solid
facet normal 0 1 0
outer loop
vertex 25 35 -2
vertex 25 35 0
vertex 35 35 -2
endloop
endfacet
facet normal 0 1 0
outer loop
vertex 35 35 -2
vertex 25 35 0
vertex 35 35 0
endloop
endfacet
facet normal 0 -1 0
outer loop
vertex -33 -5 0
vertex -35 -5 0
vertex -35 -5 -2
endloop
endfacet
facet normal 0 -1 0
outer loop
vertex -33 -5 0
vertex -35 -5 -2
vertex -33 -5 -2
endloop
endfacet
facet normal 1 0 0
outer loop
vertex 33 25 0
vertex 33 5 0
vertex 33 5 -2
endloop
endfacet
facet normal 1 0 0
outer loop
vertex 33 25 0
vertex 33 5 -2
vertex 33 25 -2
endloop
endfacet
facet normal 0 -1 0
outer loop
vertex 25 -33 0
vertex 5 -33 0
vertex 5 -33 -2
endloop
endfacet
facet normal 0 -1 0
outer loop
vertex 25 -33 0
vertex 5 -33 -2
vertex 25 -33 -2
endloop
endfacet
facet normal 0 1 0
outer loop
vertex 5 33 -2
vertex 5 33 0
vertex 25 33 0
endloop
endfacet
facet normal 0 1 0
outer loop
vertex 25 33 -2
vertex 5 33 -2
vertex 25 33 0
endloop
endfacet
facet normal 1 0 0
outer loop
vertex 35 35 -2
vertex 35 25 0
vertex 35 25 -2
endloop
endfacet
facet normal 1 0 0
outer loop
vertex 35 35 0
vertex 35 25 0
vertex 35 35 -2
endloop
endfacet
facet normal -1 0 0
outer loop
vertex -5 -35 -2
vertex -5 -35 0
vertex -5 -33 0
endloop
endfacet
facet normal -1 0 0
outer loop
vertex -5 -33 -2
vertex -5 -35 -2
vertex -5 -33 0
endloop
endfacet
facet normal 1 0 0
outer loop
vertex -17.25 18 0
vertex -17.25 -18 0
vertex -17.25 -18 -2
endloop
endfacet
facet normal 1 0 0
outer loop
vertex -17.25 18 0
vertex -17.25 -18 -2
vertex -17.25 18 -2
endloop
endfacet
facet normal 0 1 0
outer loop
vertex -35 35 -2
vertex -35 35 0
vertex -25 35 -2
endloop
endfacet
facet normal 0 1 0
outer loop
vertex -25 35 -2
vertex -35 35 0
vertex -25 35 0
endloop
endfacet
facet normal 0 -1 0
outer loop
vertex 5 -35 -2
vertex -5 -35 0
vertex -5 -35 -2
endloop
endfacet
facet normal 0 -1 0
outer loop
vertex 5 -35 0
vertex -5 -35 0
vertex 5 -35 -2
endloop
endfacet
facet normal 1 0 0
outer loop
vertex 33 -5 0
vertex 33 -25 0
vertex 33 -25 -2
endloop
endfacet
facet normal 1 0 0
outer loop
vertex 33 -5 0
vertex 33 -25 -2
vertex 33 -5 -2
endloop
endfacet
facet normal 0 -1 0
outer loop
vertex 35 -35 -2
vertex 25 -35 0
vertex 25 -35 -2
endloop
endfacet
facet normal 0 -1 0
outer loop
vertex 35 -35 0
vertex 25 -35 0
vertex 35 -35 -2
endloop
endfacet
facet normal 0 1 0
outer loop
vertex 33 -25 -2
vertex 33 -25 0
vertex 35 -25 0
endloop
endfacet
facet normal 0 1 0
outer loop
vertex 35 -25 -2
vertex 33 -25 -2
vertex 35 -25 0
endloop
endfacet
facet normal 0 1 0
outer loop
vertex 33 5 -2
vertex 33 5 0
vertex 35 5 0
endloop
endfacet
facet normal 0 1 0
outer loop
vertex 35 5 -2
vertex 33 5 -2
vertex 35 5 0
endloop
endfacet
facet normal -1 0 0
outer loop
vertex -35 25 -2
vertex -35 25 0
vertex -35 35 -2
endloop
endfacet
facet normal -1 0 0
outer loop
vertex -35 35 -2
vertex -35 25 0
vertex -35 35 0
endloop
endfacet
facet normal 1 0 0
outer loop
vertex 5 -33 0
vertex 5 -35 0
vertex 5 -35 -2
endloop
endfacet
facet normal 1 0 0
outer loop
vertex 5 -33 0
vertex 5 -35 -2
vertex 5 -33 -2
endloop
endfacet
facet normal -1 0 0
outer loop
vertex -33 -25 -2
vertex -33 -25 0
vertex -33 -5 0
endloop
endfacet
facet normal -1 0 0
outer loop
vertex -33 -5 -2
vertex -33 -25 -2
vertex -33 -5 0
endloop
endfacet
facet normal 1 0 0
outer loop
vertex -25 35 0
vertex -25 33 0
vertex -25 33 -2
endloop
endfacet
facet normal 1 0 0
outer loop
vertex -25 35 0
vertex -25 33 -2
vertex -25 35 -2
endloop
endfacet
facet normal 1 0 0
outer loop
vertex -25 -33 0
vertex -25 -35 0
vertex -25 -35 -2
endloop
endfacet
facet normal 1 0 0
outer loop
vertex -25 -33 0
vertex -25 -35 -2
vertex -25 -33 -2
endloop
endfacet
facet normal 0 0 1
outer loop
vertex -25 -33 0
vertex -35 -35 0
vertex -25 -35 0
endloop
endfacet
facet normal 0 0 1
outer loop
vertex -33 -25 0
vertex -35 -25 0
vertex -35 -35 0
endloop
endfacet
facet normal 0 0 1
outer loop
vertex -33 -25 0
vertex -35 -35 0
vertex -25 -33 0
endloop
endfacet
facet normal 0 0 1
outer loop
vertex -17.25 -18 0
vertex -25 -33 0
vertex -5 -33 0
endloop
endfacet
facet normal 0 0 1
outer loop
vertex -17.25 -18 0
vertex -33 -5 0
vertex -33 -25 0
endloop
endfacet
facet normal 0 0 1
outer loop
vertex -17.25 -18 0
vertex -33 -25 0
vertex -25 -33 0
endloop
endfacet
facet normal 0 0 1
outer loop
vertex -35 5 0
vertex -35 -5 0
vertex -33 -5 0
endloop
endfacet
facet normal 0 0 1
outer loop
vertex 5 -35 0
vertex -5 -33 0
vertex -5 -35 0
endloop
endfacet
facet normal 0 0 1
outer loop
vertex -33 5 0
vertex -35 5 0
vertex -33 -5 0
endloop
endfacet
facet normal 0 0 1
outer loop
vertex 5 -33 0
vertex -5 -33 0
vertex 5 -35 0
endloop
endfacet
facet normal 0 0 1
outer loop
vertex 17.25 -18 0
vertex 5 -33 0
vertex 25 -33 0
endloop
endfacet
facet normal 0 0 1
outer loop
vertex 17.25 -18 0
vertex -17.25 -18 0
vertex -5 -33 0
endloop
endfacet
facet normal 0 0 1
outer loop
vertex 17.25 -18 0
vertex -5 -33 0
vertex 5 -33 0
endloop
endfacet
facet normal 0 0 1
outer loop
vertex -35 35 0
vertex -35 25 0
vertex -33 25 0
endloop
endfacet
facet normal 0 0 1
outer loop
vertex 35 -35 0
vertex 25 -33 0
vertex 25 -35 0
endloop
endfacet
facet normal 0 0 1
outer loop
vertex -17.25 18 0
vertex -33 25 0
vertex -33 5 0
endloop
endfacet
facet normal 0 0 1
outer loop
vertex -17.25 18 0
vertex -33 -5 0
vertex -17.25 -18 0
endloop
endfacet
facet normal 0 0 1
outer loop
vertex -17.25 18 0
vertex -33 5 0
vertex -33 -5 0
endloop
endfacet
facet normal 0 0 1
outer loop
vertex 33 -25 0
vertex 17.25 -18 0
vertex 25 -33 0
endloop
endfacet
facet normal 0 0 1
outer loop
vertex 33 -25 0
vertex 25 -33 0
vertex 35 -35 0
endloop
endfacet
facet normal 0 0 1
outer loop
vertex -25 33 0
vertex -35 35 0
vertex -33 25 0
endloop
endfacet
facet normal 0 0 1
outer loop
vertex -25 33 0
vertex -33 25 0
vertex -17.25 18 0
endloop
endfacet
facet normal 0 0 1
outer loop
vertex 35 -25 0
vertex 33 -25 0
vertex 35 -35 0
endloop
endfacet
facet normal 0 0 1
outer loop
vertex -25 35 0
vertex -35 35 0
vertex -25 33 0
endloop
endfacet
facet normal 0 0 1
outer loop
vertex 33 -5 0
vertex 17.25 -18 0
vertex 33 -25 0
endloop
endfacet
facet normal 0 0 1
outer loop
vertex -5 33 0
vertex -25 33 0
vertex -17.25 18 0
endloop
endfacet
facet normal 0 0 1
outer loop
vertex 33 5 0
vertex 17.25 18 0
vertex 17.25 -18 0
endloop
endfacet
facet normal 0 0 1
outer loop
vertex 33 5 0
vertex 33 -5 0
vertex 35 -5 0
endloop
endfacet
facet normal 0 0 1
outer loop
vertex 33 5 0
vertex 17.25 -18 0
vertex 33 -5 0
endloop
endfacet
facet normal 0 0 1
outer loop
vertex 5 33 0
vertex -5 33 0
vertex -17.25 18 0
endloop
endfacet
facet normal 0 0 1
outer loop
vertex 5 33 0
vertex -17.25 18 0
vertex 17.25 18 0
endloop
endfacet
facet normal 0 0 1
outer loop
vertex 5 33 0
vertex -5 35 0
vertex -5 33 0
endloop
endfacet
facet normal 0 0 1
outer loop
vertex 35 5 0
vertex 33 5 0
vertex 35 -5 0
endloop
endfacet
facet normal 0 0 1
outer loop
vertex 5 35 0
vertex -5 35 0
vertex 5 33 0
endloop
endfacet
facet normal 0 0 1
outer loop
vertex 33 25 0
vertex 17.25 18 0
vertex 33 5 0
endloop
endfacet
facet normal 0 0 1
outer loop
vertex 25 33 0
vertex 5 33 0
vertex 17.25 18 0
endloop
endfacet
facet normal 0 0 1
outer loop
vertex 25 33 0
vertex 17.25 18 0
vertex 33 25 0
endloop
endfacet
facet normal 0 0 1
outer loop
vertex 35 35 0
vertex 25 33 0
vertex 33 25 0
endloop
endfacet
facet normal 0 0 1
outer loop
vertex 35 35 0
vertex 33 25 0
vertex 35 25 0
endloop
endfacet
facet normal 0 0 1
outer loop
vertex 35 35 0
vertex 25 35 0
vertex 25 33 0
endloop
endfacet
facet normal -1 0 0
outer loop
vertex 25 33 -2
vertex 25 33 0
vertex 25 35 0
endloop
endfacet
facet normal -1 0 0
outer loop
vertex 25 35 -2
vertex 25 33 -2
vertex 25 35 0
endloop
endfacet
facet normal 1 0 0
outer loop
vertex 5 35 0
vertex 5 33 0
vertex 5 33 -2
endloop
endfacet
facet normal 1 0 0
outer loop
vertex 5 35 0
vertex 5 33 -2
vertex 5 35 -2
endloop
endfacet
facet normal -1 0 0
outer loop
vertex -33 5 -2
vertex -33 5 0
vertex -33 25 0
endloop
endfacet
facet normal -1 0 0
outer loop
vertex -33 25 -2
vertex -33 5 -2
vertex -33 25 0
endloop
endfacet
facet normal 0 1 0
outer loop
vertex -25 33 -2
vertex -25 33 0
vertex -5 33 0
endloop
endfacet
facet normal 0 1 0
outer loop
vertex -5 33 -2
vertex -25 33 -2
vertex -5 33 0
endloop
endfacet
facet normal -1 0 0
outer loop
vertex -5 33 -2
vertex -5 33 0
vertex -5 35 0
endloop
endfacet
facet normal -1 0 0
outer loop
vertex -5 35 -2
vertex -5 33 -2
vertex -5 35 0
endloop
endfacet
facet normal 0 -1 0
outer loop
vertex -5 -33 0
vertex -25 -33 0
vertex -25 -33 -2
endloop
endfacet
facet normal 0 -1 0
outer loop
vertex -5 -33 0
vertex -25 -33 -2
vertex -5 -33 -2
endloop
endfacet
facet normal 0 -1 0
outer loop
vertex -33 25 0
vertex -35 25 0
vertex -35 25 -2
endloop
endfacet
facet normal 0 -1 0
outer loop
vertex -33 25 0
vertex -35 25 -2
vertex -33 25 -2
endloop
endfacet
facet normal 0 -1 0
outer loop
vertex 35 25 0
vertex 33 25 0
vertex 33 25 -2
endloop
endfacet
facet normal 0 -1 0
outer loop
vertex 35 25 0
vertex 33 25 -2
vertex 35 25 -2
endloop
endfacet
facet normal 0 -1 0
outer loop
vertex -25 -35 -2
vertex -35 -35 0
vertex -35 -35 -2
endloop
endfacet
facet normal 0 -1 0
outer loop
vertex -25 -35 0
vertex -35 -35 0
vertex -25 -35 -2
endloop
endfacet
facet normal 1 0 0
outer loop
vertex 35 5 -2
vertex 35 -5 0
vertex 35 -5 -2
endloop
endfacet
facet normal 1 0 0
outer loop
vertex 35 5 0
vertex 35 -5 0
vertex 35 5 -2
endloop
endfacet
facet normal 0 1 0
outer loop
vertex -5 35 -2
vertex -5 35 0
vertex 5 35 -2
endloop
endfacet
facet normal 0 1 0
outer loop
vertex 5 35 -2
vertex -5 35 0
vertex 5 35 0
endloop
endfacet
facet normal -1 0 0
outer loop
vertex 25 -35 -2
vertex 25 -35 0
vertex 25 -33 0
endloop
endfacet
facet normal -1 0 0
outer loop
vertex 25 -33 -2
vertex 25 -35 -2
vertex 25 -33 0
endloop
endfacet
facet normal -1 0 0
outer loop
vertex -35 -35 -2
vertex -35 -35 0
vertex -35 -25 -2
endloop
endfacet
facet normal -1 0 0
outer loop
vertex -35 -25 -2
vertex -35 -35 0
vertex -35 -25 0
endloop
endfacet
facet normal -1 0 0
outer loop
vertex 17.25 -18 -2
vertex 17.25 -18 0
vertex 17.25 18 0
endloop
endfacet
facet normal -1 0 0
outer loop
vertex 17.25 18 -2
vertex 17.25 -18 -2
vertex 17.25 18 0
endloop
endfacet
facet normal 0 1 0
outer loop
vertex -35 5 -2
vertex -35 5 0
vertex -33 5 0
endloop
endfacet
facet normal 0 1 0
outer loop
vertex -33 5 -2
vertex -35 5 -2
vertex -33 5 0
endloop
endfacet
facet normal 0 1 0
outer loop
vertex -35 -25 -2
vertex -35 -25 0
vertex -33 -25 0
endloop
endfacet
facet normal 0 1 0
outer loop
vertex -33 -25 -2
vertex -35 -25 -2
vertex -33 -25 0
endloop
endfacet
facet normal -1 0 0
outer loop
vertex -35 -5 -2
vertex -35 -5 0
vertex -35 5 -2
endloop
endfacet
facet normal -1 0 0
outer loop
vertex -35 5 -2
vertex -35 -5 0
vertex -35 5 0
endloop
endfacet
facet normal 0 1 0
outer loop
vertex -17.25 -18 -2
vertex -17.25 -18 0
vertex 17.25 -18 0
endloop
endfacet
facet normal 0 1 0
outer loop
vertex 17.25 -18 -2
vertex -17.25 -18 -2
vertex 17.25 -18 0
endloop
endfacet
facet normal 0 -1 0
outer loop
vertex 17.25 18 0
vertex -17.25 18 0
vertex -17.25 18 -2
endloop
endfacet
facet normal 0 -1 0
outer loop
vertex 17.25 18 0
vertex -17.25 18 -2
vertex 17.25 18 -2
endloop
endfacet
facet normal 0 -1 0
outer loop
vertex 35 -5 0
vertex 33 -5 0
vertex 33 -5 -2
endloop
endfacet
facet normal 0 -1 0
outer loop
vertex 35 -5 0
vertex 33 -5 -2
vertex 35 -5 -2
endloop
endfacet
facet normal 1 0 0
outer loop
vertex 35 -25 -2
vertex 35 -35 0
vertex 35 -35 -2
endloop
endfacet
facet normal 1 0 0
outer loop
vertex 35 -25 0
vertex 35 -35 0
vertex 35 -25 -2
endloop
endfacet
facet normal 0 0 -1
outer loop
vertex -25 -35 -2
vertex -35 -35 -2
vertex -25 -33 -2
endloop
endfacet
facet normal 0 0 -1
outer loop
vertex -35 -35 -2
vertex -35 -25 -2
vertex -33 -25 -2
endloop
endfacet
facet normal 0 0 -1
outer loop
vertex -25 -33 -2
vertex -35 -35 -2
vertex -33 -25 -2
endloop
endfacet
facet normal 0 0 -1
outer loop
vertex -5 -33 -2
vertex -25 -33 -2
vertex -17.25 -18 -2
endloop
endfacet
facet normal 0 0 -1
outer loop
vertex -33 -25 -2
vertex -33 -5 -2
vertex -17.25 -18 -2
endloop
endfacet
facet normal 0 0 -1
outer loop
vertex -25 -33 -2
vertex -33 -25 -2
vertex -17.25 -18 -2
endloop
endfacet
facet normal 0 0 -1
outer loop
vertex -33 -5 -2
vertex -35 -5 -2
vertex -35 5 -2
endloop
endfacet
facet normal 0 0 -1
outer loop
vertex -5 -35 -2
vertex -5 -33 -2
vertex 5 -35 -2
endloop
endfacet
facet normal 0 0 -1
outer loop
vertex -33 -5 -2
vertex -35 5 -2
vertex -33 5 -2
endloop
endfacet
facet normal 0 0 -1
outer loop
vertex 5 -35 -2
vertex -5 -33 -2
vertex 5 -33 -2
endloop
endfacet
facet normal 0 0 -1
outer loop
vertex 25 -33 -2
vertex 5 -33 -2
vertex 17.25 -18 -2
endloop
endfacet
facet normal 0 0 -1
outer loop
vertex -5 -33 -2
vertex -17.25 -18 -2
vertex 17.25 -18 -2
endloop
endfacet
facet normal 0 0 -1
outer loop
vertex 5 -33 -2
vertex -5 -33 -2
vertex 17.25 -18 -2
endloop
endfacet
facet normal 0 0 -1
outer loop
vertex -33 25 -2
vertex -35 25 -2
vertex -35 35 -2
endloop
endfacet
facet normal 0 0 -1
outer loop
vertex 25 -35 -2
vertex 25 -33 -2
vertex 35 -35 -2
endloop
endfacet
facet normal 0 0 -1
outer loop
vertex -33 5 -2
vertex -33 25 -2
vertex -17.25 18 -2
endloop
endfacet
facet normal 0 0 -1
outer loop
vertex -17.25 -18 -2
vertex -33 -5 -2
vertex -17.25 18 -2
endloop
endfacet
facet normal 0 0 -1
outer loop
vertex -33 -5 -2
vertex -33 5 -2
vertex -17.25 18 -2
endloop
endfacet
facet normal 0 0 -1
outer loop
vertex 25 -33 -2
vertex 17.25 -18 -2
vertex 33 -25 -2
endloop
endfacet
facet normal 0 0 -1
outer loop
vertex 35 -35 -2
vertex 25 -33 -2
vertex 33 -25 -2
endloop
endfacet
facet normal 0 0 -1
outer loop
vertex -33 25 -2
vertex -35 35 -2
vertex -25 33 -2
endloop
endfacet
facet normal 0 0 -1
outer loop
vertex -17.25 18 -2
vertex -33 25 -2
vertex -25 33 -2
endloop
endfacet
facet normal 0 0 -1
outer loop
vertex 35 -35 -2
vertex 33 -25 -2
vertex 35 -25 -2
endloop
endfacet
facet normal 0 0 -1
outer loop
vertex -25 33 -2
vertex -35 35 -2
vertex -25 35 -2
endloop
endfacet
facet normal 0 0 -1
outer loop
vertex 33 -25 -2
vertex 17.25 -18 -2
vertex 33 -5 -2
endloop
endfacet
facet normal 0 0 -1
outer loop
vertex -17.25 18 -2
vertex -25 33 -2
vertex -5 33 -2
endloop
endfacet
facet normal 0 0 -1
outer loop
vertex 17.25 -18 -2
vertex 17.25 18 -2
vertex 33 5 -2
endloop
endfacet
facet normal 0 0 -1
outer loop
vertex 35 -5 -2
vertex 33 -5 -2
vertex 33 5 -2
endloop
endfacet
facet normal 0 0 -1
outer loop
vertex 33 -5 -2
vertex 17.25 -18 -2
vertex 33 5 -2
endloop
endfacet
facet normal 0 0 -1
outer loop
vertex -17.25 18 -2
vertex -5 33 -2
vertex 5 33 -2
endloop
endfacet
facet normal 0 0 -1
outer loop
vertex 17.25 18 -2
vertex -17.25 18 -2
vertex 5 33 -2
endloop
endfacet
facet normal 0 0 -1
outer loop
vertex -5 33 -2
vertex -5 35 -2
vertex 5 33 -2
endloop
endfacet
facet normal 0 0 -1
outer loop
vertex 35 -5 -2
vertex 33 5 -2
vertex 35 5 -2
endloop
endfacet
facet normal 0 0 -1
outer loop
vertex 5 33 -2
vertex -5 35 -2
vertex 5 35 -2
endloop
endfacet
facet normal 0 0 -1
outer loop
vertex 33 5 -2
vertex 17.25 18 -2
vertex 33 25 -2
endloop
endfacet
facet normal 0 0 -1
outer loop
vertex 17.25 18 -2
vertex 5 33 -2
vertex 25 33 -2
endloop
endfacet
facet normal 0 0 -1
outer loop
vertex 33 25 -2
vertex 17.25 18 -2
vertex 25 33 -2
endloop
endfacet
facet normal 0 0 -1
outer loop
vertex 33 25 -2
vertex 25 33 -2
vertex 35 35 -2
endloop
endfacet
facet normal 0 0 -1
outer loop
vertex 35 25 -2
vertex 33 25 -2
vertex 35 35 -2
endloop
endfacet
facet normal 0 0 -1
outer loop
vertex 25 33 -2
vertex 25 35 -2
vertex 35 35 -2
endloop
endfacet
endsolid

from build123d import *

# Parameters (mm, degrees)
SKETCH1_W           = 70
SKETCH1_H           = 70
SKETCH1_W_2         = 34.5
SKETCH1_H_2         = 36
BOSS_EXTRUDE1_DEPTH = 2
SKETCH2_W           = 2
SKETCH2_H           = 20
SKETCH2_W_2         = 20
SKETCH2_H_2         = 2
CUT_EXTRUDE1_DEPTH  = 2


with BuildPart() as part:
    # Sketch1 → Boss-Extrude1 (new body)
    with BuildSketch(Plane.XY):
        Rectangle(SKETCH1_W, SKETCH1_H)
        Rectangle(SKETCH1_W_2, SKETCH1_H_2, mode=Mode.SUBTRACT)
    extrude(amount=-BOSS_EXTRUDE1_DEPTH)

    # Sketch2 → Cut-Extrude1 (cut)
    with BuildSketch(Plane.XY):
        with Locations((-34, 15)):
            Rectangle(SKETCH2_W, SKETCH2_H)
        with Locations((-34, -15)):
            Rectangle(SKETCH2_W, SKETCH2_H)
        with Locations((-15, -34)):
            Rectangle(SKETCH2_W_2, SKETCH2_H_2)
        with Locations((15, -34)):
            Rectangle(SKETCH2_W_2, SKETCH2_H_2)
        with Locations((34, -15)):
            Rectangle(SKETCH2_W, SKETCH2_H)
        with Locations((34, 15)):
            Rectangle(SKETCH2_W, SKETCH2_H)
        with Locations((15, 34)):
            Rectangle(SKETCH2_W_2, SKETCH2_H_2)
        with Locations((-15, 34)):
            Rectangle(SKETCH2_W_2, SKETCH2_H_2)
    extrude(amount=-CUT_EXTRUDE1_DEPTH, mode=Mode.SUBTRACT)


solid = part.part
